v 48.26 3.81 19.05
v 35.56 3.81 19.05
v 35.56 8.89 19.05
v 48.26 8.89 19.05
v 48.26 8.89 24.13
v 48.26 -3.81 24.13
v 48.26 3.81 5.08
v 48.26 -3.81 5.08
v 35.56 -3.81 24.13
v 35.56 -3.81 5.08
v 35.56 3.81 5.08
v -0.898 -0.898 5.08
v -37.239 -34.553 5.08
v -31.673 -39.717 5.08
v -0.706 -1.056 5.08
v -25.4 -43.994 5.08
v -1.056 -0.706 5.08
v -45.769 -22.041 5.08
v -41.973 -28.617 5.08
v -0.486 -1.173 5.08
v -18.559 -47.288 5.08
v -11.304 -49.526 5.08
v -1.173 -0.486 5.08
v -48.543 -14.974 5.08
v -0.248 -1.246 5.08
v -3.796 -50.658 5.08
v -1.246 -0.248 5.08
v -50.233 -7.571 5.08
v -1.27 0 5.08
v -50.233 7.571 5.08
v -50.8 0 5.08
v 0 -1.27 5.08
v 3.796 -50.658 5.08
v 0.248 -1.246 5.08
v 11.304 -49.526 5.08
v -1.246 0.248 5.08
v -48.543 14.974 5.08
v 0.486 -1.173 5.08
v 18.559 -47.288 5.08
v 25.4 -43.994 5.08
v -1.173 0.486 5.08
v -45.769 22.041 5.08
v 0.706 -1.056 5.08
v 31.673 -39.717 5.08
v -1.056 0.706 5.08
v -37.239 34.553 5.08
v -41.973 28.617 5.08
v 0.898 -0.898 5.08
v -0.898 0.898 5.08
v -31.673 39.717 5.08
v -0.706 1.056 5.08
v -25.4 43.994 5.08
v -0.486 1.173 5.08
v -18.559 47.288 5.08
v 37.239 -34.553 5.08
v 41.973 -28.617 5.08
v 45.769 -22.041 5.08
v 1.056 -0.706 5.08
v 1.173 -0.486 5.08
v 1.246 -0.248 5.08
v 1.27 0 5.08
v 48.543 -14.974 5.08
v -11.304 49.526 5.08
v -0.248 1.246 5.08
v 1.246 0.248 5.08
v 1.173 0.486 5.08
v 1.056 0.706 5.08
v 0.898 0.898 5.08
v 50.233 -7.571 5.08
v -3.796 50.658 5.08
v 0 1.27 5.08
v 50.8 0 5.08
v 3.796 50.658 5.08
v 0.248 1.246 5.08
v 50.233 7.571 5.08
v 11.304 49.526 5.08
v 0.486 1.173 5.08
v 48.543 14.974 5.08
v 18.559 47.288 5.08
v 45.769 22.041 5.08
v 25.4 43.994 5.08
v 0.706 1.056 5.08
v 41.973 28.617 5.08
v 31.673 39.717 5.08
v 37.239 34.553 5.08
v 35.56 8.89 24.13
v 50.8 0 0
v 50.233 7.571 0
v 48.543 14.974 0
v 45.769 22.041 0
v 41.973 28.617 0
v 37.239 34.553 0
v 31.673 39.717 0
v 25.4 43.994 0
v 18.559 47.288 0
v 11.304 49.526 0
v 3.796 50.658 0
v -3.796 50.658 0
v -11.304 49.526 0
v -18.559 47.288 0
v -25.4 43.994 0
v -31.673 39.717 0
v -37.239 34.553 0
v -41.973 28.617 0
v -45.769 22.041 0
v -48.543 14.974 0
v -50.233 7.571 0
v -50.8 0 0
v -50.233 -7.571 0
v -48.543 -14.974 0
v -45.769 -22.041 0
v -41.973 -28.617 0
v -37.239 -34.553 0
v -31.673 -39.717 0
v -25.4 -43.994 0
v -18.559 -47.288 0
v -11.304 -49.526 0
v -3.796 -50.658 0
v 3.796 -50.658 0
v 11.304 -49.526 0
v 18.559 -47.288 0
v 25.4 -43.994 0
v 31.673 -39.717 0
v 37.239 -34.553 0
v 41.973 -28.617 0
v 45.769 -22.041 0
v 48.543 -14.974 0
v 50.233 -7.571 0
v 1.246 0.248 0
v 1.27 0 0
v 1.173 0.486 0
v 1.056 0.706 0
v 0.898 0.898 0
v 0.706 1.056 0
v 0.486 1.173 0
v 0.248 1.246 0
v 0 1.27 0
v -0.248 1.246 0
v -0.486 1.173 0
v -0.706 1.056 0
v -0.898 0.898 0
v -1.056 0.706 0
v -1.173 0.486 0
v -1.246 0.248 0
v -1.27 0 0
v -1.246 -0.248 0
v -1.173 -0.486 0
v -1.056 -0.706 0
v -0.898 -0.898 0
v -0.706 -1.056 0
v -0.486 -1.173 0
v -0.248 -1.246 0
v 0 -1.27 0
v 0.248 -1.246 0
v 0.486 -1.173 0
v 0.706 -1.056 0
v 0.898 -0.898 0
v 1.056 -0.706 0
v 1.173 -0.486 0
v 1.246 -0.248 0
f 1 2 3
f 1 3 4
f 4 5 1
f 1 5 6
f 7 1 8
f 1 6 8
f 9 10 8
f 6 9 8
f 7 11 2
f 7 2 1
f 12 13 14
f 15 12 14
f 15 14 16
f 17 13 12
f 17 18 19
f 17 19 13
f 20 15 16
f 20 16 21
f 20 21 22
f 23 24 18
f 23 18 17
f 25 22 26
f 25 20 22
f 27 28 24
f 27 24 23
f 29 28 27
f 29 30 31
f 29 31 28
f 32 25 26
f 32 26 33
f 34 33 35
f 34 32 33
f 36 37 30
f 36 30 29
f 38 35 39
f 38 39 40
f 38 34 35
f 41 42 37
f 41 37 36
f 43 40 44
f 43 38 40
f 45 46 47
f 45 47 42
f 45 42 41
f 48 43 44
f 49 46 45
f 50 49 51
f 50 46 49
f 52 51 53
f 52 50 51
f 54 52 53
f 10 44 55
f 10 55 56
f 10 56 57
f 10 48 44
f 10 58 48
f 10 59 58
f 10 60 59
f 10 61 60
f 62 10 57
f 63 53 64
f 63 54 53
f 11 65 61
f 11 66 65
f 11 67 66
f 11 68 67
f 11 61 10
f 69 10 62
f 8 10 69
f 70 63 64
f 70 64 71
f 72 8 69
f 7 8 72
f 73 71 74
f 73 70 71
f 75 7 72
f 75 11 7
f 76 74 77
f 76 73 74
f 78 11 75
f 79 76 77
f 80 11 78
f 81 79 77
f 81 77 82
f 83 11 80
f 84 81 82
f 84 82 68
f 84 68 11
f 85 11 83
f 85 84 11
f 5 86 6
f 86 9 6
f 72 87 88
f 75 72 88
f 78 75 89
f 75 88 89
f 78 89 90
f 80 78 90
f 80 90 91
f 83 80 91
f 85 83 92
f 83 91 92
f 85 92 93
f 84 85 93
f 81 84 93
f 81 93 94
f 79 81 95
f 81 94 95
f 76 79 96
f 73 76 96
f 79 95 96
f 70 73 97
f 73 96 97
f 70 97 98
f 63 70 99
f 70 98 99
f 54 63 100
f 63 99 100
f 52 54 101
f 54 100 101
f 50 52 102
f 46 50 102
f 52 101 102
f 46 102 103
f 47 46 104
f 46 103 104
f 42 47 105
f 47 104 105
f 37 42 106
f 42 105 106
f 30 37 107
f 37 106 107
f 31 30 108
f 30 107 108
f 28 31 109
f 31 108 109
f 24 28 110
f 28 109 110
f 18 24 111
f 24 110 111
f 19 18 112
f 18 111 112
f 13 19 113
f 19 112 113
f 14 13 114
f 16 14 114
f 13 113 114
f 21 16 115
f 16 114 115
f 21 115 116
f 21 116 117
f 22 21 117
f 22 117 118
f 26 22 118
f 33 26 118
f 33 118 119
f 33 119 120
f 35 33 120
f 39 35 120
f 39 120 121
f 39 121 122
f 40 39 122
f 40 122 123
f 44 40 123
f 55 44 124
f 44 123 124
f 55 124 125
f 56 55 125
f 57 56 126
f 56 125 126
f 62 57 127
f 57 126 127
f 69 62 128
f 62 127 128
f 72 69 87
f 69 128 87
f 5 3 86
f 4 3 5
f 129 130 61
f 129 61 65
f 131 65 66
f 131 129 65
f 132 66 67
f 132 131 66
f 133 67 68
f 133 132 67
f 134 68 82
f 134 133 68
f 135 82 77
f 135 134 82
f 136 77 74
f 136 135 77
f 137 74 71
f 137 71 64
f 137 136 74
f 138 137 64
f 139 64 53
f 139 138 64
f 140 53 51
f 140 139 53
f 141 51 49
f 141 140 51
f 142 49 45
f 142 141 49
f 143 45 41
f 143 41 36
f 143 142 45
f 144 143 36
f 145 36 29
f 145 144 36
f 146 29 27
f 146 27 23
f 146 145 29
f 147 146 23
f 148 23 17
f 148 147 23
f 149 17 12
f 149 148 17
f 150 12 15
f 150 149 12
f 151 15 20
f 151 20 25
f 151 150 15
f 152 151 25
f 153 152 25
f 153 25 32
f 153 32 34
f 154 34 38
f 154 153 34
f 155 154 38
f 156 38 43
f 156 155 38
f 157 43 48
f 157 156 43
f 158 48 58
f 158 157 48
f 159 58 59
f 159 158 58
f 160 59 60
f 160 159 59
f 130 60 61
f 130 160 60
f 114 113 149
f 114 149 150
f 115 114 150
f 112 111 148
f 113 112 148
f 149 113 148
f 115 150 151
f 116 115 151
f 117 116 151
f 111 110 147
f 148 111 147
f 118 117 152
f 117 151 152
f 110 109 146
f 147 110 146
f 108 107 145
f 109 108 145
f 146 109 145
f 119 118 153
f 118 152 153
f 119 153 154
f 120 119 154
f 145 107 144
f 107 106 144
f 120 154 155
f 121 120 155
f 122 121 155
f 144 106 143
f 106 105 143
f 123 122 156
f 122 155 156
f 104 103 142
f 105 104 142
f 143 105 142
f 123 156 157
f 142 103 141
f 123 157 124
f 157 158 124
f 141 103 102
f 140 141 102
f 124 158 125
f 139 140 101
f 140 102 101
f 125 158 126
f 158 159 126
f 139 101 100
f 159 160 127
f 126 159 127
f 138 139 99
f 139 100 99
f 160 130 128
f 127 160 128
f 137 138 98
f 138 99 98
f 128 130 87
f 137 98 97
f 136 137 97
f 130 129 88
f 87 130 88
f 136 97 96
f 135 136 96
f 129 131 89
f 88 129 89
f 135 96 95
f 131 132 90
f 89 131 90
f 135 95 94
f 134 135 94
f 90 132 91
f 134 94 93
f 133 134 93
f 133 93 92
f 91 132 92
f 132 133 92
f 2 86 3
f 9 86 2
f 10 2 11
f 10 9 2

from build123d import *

# Parameters (mm, degrees)
SKETCH1_R           = 50.8
SKETCH1_R_2         = 1.27
BOSS_EXTRUDE1_DEPTH = 5.08
SKETCH2_W           = 12.7
SKETCH2_H           = 7.62
BOSS_EXTRUDE2_DEPTH = 19.05
SKETCH3_W           = 12.7
SKETCH3_H           = 5.08
BOSS_EXTRUDE3_DEPTH = 5.08


with BuildPart() as part:
    # Sketch1 → Boss-Extrude1 (new body)
    with BuildSketch(Plane.XY):
        Circle(SKETCH1_R)
        Circle(SKETCH1_R_2, mode=Mode.SUBTRACT)
    extrude(amount=BOSS_EXTRUDE1_DEPTH)

    # Sketch2 → Boss-Extrude2 (add)
    with BuildSketch(Plane.XY.offset(5.08)):
        with Locations((41.91, 0)):
            Rectangle(SKETCH2_W, SKETCH2_H)
    extrude(amount=BOSS_EXTRUDE2_DEPTH)

    # Sketch3 → Boss-Extrude3 (add)
    with BuildSketch(Plane(origin=(0, 3.81, 0), x_dir=(1, 0, 0), z_dir=(0, 1, 0))):
        with Locations((41.91, -21.59)):
            Rectangle(SKETCH3_W, SKETCH3_H)
    extrude(amount=BOSS_EXTRUDE3_DEPTH)


solid = part.part
